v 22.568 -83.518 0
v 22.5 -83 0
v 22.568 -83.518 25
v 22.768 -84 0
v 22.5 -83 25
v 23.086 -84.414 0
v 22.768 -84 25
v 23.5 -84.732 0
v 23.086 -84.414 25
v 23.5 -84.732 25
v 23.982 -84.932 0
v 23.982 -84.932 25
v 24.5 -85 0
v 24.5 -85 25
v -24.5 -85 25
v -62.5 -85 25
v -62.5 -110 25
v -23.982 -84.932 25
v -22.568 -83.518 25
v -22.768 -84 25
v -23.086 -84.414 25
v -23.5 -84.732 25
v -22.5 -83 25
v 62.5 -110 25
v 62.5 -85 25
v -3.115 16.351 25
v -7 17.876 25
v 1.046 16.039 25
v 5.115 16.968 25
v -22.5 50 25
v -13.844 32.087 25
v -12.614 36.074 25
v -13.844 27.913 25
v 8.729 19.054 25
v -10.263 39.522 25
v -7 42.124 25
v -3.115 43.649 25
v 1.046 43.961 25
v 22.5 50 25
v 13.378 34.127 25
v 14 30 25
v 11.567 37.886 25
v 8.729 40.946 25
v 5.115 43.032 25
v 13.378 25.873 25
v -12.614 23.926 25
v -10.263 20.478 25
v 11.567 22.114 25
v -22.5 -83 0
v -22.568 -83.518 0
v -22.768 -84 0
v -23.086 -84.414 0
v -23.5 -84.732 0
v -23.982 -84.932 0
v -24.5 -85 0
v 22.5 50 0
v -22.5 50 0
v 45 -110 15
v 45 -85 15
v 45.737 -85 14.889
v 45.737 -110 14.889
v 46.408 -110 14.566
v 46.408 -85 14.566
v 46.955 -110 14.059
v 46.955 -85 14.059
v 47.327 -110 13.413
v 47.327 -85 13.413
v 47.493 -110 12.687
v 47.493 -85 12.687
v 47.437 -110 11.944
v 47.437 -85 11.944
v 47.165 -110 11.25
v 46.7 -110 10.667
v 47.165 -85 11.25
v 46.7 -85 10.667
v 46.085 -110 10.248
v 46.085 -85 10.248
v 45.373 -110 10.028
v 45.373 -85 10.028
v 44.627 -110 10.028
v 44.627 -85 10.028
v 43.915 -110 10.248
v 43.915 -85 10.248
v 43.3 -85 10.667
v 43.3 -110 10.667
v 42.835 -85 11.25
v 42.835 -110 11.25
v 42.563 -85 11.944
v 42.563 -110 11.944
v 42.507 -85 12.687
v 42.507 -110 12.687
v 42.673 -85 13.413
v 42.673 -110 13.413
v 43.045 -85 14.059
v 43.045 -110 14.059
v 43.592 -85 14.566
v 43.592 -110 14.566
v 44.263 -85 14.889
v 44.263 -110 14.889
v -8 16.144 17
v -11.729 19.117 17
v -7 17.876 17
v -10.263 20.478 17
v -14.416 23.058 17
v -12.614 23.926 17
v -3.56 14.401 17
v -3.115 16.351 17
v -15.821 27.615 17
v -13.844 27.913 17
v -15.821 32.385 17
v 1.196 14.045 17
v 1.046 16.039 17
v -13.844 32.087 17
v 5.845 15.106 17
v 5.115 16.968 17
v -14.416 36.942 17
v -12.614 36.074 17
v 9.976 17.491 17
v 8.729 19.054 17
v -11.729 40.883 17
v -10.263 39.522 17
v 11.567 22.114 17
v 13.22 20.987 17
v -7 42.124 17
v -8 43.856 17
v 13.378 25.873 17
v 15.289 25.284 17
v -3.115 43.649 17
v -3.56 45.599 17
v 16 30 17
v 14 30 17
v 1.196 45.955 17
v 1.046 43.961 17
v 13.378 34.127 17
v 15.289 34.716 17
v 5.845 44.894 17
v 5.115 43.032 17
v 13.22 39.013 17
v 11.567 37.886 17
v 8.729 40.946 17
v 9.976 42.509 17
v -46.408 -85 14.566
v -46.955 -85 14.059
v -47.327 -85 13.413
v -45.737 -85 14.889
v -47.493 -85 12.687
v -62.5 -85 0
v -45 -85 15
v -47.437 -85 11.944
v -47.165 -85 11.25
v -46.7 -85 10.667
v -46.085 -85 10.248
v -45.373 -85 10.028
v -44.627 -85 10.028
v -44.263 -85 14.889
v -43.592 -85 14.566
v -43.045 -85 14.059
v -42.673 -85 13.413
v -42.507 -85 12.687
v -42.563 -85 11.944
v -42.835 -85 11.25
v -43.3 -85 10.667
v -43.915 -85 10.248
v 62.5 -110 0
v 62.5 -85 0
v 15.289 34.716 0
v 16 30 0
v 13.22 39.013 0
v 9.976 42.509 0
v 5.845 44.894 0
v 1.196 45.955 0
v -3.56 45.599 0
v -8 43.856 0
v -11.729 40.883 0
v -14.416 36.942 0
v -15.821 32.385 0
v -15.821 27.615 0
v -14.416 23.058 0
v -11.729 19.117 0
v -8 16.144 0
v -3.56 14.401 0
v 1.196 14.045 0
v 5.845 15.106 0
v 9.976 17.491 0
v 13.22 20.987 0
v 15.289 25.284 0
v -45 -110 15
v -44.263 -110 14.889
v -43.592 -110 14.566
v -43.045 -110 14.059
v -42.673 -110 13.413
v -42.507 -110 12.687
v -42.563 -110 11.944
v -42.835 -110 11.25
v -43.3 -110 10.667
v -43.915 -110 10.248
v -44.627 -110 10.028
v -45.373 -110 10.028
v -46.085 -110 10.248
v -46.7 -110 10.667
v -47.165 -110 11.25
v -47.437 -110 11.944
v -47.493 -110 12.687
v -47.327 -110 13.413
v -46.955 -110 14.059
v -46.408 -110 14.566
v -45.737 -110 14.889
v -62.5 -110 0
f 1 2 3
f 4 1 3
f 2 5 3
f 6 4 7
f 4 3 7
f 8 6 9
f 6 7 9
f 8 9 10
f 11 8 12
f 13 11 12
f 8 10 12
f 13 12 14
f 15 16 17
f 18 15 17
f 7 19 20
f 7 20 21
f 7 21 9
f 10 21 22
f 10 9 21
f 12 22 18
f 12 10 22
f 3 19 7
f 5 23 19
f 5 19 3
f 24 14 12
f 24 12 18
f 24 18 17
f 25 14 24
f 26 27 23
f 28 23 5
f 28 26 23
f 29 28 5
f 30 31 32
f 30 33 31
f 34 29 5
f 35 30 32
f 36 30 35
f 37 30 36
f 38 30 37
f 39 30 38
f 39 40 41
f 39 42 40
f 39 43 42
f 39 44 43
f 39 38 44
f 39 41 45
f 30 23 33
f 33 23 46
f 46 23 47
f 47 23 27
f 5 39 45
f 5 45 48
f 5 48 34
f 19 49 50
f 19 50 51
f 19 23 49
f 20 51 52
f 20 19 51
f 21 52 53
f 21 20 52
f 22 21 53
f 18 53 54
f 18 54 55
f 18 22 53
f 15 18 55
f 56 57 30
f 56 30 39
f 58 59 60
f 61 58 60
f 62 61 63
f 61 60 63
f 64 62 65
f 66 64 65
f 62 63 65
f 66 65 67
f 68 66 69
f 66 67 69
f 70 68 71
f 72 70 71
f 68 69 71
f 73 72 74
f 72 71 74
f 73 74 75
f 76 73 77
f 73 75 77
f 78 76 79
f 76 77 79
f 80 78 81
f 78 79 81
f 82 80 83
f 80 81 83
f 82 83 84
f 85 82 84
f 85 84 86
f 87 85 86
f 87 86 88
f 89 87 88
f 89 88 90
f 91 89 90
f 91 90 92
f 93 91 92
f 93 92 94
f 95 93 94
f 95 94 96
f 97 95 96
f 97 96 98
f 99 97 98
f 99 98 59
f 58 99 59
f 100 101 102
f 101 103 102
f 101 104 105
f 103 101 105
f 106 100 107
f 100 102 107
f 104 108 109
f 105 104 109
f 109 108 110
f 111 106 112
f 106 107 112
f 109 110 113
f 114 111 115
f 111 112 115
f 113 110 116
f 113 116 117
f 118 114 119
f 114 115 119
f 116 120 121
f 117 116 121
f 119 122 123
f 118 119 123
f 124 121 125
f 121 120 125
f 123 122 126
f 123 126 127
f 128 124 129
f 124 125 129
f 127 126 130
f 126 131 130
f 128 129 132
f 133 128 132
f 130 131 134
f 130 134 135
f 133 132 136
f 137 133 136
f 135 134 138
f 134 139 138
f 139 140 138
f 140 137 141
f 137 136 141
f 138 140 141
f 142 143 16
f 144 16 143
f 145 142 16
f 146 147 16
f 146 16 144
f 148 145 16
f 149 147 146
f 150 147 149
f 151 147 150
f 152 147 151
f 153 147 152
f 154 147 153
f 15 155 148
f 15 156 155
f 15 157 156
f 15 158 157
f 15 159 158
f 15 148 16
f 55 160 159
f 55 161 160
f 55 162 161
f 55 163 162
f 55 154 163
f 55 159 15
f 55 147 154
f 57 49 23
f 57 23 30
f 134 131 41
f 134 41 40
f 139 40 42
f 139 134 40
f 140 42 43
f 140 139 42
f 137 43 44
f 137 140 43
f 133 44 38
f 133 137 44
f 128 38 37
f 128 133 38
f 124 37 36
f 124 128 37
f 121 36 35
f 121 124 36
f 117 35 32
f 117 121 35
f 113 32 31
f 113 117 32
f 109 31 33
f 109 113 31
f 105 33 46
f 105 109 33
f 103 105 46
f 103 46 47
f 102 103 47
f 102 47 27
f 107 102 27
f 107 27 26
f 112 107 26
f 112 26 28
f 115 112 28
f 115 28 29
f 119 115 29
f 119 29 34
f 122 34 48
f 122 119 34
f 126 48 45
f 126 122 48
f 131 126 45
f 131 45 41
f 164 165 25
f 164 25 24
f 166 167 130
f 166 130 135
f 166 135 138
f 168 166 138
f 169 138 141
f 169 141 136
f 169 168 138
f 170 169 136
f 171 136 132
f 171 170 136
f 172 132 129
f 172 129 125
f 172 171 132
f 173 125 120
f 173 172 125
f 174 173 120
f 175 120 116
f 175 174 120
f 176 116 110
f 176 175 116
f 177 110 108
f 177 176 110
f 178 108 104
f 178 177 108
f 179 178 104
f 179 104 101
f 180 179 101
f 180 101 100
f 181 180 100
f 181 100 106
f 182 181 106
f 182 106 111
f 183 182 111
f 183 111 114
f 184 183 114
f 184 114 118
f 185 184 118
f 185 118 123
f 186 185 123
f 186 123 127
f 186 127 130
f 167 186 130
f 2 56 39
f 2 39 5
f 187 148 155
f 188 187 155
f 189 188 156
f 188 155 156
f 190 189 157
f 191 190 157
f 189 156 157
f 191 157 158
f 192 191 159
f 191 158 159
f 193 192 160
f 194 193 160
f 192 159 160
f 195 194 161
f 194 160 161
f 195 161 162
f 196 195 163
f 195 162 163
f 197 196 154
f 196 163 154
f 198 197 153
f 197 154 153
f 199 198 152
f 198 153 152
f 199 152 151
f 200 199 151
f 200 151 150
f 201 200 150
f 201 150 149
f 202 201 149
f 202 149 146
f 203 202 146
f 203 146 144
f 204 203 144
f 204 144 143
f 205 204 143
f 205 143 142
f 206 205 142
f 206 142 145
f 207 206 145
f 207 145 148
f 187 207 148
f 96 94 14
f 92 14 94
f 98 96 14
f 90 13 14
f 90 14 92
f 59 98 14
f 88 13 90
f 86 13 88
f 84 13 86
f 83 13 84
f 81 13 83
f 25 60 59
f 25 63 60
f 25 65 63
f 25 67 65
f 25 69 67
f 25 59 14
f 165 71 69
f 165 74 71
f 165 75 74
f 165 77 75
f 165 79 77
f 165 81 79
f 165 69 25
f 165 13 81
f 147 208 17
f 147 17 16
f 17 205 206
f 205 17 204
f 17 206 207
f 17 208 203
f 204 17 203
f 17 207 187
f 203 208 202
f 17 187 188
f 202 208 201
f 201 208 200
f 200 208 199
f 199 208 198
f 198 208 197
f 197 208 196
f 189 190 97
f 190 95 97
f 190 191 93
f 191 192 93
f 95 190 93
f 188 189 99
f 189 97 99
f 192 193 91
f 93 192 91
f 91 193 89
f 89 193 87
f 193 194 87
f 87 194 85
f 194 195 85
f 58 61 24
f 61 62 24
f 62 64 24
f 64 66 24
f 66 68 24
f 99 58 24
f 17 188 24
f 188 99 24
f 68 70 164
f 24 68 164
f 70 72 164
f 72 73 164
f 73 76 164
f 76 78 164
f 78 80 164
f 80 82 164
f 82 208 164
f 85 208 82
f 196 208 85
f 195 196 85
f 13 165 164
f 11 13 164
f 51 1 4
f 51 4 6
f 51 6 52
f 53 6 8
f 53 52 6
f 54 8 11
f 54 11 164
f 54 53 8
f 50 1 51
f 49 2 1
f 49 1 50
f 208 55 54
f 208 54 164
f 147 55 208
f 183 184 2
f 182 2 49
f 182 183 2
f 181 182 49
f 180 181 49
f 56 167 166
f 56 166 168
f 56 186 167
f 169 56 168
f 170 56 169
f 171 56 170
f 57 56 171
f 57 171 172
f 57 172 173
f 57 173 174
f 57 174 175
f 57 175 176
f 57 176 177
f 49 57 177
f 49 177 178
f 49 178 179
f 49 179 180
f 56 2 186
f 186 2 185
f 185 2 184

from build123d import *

# Parameters (mm, degrees)
SKETCH_1_R          = 16
EXTRUDE_1_DEPTH     = 25
FILLET_1_R          = 2
SKETCH_3_R          = 2.5
CUT_EXTRUDE_1_DEPTH = 30
EXTRUDE_START       = -8
SKETCH_4_R          = 16
SKETCH_4_R_2        = 14
EXTRUDE_2_DEPTH     = 8


with BuildPart() as part:
    # 草图1 → 凸台-拉伸1 (new body)
    with BuildSketch(Plane.XY):
        Polygon((-22.5, 50), (22.5, 50), (22.5, -85), (62.5, -85), (62.5, -110), (22.5, -110), (-22.5, -110), (-62.5, -110), (-62.5, -85), (-22.5, -85), align=None)
        with Locations((0, 30)):
            Circle(SKETCH_1_R, mode=Mode.SUBTRACT)
    extrude(amount=EXTRUDE_1_DEPTH)

    # 圆角1
    fillet_1_edges = [part.edges().sort_by_distance(p)[0] for p in [
        (-22.5, -85, 12.5),
        (22.5, -85, 12.5),
    ]]
    fillet(fillet_1_edges, radius=FILLET_1_R)

    # 草图3 → 切除-拉伸1 (cut)
    with BuildSketch(Plane(origin=(0, -85, 0), x_dir=(1, 0, 0), z_dir=(0, 1, 0))):
        with Locations(Location((-45, -12.5, 0), (0, 0, 270))):
            Circle(SKETCH_3_R)
        with Locations(Location((45, -12.5, 0), (0, 0, 270))):
            Circle(SKETCH_3_R)
    extrude(amount=-CUT_EXTRUDE_1_DEPTH, mode=Mode.SUBTRACT)

    # 草图4 → 凸台-拉伸2 (add)
    with BuildSketch(Plane.XY.offset(25).offset(EXTRUDE_START)):
        with Locations((0, 30)):
            Circle(SKETCH_4_R)
        with Locations((0, 30)):
            Circle(SKETCH_4_R_2, mode=Mode.SUBTRACT)
    extrude(amount=EXTRUDE_2_DEPTH)


solid = part.part
